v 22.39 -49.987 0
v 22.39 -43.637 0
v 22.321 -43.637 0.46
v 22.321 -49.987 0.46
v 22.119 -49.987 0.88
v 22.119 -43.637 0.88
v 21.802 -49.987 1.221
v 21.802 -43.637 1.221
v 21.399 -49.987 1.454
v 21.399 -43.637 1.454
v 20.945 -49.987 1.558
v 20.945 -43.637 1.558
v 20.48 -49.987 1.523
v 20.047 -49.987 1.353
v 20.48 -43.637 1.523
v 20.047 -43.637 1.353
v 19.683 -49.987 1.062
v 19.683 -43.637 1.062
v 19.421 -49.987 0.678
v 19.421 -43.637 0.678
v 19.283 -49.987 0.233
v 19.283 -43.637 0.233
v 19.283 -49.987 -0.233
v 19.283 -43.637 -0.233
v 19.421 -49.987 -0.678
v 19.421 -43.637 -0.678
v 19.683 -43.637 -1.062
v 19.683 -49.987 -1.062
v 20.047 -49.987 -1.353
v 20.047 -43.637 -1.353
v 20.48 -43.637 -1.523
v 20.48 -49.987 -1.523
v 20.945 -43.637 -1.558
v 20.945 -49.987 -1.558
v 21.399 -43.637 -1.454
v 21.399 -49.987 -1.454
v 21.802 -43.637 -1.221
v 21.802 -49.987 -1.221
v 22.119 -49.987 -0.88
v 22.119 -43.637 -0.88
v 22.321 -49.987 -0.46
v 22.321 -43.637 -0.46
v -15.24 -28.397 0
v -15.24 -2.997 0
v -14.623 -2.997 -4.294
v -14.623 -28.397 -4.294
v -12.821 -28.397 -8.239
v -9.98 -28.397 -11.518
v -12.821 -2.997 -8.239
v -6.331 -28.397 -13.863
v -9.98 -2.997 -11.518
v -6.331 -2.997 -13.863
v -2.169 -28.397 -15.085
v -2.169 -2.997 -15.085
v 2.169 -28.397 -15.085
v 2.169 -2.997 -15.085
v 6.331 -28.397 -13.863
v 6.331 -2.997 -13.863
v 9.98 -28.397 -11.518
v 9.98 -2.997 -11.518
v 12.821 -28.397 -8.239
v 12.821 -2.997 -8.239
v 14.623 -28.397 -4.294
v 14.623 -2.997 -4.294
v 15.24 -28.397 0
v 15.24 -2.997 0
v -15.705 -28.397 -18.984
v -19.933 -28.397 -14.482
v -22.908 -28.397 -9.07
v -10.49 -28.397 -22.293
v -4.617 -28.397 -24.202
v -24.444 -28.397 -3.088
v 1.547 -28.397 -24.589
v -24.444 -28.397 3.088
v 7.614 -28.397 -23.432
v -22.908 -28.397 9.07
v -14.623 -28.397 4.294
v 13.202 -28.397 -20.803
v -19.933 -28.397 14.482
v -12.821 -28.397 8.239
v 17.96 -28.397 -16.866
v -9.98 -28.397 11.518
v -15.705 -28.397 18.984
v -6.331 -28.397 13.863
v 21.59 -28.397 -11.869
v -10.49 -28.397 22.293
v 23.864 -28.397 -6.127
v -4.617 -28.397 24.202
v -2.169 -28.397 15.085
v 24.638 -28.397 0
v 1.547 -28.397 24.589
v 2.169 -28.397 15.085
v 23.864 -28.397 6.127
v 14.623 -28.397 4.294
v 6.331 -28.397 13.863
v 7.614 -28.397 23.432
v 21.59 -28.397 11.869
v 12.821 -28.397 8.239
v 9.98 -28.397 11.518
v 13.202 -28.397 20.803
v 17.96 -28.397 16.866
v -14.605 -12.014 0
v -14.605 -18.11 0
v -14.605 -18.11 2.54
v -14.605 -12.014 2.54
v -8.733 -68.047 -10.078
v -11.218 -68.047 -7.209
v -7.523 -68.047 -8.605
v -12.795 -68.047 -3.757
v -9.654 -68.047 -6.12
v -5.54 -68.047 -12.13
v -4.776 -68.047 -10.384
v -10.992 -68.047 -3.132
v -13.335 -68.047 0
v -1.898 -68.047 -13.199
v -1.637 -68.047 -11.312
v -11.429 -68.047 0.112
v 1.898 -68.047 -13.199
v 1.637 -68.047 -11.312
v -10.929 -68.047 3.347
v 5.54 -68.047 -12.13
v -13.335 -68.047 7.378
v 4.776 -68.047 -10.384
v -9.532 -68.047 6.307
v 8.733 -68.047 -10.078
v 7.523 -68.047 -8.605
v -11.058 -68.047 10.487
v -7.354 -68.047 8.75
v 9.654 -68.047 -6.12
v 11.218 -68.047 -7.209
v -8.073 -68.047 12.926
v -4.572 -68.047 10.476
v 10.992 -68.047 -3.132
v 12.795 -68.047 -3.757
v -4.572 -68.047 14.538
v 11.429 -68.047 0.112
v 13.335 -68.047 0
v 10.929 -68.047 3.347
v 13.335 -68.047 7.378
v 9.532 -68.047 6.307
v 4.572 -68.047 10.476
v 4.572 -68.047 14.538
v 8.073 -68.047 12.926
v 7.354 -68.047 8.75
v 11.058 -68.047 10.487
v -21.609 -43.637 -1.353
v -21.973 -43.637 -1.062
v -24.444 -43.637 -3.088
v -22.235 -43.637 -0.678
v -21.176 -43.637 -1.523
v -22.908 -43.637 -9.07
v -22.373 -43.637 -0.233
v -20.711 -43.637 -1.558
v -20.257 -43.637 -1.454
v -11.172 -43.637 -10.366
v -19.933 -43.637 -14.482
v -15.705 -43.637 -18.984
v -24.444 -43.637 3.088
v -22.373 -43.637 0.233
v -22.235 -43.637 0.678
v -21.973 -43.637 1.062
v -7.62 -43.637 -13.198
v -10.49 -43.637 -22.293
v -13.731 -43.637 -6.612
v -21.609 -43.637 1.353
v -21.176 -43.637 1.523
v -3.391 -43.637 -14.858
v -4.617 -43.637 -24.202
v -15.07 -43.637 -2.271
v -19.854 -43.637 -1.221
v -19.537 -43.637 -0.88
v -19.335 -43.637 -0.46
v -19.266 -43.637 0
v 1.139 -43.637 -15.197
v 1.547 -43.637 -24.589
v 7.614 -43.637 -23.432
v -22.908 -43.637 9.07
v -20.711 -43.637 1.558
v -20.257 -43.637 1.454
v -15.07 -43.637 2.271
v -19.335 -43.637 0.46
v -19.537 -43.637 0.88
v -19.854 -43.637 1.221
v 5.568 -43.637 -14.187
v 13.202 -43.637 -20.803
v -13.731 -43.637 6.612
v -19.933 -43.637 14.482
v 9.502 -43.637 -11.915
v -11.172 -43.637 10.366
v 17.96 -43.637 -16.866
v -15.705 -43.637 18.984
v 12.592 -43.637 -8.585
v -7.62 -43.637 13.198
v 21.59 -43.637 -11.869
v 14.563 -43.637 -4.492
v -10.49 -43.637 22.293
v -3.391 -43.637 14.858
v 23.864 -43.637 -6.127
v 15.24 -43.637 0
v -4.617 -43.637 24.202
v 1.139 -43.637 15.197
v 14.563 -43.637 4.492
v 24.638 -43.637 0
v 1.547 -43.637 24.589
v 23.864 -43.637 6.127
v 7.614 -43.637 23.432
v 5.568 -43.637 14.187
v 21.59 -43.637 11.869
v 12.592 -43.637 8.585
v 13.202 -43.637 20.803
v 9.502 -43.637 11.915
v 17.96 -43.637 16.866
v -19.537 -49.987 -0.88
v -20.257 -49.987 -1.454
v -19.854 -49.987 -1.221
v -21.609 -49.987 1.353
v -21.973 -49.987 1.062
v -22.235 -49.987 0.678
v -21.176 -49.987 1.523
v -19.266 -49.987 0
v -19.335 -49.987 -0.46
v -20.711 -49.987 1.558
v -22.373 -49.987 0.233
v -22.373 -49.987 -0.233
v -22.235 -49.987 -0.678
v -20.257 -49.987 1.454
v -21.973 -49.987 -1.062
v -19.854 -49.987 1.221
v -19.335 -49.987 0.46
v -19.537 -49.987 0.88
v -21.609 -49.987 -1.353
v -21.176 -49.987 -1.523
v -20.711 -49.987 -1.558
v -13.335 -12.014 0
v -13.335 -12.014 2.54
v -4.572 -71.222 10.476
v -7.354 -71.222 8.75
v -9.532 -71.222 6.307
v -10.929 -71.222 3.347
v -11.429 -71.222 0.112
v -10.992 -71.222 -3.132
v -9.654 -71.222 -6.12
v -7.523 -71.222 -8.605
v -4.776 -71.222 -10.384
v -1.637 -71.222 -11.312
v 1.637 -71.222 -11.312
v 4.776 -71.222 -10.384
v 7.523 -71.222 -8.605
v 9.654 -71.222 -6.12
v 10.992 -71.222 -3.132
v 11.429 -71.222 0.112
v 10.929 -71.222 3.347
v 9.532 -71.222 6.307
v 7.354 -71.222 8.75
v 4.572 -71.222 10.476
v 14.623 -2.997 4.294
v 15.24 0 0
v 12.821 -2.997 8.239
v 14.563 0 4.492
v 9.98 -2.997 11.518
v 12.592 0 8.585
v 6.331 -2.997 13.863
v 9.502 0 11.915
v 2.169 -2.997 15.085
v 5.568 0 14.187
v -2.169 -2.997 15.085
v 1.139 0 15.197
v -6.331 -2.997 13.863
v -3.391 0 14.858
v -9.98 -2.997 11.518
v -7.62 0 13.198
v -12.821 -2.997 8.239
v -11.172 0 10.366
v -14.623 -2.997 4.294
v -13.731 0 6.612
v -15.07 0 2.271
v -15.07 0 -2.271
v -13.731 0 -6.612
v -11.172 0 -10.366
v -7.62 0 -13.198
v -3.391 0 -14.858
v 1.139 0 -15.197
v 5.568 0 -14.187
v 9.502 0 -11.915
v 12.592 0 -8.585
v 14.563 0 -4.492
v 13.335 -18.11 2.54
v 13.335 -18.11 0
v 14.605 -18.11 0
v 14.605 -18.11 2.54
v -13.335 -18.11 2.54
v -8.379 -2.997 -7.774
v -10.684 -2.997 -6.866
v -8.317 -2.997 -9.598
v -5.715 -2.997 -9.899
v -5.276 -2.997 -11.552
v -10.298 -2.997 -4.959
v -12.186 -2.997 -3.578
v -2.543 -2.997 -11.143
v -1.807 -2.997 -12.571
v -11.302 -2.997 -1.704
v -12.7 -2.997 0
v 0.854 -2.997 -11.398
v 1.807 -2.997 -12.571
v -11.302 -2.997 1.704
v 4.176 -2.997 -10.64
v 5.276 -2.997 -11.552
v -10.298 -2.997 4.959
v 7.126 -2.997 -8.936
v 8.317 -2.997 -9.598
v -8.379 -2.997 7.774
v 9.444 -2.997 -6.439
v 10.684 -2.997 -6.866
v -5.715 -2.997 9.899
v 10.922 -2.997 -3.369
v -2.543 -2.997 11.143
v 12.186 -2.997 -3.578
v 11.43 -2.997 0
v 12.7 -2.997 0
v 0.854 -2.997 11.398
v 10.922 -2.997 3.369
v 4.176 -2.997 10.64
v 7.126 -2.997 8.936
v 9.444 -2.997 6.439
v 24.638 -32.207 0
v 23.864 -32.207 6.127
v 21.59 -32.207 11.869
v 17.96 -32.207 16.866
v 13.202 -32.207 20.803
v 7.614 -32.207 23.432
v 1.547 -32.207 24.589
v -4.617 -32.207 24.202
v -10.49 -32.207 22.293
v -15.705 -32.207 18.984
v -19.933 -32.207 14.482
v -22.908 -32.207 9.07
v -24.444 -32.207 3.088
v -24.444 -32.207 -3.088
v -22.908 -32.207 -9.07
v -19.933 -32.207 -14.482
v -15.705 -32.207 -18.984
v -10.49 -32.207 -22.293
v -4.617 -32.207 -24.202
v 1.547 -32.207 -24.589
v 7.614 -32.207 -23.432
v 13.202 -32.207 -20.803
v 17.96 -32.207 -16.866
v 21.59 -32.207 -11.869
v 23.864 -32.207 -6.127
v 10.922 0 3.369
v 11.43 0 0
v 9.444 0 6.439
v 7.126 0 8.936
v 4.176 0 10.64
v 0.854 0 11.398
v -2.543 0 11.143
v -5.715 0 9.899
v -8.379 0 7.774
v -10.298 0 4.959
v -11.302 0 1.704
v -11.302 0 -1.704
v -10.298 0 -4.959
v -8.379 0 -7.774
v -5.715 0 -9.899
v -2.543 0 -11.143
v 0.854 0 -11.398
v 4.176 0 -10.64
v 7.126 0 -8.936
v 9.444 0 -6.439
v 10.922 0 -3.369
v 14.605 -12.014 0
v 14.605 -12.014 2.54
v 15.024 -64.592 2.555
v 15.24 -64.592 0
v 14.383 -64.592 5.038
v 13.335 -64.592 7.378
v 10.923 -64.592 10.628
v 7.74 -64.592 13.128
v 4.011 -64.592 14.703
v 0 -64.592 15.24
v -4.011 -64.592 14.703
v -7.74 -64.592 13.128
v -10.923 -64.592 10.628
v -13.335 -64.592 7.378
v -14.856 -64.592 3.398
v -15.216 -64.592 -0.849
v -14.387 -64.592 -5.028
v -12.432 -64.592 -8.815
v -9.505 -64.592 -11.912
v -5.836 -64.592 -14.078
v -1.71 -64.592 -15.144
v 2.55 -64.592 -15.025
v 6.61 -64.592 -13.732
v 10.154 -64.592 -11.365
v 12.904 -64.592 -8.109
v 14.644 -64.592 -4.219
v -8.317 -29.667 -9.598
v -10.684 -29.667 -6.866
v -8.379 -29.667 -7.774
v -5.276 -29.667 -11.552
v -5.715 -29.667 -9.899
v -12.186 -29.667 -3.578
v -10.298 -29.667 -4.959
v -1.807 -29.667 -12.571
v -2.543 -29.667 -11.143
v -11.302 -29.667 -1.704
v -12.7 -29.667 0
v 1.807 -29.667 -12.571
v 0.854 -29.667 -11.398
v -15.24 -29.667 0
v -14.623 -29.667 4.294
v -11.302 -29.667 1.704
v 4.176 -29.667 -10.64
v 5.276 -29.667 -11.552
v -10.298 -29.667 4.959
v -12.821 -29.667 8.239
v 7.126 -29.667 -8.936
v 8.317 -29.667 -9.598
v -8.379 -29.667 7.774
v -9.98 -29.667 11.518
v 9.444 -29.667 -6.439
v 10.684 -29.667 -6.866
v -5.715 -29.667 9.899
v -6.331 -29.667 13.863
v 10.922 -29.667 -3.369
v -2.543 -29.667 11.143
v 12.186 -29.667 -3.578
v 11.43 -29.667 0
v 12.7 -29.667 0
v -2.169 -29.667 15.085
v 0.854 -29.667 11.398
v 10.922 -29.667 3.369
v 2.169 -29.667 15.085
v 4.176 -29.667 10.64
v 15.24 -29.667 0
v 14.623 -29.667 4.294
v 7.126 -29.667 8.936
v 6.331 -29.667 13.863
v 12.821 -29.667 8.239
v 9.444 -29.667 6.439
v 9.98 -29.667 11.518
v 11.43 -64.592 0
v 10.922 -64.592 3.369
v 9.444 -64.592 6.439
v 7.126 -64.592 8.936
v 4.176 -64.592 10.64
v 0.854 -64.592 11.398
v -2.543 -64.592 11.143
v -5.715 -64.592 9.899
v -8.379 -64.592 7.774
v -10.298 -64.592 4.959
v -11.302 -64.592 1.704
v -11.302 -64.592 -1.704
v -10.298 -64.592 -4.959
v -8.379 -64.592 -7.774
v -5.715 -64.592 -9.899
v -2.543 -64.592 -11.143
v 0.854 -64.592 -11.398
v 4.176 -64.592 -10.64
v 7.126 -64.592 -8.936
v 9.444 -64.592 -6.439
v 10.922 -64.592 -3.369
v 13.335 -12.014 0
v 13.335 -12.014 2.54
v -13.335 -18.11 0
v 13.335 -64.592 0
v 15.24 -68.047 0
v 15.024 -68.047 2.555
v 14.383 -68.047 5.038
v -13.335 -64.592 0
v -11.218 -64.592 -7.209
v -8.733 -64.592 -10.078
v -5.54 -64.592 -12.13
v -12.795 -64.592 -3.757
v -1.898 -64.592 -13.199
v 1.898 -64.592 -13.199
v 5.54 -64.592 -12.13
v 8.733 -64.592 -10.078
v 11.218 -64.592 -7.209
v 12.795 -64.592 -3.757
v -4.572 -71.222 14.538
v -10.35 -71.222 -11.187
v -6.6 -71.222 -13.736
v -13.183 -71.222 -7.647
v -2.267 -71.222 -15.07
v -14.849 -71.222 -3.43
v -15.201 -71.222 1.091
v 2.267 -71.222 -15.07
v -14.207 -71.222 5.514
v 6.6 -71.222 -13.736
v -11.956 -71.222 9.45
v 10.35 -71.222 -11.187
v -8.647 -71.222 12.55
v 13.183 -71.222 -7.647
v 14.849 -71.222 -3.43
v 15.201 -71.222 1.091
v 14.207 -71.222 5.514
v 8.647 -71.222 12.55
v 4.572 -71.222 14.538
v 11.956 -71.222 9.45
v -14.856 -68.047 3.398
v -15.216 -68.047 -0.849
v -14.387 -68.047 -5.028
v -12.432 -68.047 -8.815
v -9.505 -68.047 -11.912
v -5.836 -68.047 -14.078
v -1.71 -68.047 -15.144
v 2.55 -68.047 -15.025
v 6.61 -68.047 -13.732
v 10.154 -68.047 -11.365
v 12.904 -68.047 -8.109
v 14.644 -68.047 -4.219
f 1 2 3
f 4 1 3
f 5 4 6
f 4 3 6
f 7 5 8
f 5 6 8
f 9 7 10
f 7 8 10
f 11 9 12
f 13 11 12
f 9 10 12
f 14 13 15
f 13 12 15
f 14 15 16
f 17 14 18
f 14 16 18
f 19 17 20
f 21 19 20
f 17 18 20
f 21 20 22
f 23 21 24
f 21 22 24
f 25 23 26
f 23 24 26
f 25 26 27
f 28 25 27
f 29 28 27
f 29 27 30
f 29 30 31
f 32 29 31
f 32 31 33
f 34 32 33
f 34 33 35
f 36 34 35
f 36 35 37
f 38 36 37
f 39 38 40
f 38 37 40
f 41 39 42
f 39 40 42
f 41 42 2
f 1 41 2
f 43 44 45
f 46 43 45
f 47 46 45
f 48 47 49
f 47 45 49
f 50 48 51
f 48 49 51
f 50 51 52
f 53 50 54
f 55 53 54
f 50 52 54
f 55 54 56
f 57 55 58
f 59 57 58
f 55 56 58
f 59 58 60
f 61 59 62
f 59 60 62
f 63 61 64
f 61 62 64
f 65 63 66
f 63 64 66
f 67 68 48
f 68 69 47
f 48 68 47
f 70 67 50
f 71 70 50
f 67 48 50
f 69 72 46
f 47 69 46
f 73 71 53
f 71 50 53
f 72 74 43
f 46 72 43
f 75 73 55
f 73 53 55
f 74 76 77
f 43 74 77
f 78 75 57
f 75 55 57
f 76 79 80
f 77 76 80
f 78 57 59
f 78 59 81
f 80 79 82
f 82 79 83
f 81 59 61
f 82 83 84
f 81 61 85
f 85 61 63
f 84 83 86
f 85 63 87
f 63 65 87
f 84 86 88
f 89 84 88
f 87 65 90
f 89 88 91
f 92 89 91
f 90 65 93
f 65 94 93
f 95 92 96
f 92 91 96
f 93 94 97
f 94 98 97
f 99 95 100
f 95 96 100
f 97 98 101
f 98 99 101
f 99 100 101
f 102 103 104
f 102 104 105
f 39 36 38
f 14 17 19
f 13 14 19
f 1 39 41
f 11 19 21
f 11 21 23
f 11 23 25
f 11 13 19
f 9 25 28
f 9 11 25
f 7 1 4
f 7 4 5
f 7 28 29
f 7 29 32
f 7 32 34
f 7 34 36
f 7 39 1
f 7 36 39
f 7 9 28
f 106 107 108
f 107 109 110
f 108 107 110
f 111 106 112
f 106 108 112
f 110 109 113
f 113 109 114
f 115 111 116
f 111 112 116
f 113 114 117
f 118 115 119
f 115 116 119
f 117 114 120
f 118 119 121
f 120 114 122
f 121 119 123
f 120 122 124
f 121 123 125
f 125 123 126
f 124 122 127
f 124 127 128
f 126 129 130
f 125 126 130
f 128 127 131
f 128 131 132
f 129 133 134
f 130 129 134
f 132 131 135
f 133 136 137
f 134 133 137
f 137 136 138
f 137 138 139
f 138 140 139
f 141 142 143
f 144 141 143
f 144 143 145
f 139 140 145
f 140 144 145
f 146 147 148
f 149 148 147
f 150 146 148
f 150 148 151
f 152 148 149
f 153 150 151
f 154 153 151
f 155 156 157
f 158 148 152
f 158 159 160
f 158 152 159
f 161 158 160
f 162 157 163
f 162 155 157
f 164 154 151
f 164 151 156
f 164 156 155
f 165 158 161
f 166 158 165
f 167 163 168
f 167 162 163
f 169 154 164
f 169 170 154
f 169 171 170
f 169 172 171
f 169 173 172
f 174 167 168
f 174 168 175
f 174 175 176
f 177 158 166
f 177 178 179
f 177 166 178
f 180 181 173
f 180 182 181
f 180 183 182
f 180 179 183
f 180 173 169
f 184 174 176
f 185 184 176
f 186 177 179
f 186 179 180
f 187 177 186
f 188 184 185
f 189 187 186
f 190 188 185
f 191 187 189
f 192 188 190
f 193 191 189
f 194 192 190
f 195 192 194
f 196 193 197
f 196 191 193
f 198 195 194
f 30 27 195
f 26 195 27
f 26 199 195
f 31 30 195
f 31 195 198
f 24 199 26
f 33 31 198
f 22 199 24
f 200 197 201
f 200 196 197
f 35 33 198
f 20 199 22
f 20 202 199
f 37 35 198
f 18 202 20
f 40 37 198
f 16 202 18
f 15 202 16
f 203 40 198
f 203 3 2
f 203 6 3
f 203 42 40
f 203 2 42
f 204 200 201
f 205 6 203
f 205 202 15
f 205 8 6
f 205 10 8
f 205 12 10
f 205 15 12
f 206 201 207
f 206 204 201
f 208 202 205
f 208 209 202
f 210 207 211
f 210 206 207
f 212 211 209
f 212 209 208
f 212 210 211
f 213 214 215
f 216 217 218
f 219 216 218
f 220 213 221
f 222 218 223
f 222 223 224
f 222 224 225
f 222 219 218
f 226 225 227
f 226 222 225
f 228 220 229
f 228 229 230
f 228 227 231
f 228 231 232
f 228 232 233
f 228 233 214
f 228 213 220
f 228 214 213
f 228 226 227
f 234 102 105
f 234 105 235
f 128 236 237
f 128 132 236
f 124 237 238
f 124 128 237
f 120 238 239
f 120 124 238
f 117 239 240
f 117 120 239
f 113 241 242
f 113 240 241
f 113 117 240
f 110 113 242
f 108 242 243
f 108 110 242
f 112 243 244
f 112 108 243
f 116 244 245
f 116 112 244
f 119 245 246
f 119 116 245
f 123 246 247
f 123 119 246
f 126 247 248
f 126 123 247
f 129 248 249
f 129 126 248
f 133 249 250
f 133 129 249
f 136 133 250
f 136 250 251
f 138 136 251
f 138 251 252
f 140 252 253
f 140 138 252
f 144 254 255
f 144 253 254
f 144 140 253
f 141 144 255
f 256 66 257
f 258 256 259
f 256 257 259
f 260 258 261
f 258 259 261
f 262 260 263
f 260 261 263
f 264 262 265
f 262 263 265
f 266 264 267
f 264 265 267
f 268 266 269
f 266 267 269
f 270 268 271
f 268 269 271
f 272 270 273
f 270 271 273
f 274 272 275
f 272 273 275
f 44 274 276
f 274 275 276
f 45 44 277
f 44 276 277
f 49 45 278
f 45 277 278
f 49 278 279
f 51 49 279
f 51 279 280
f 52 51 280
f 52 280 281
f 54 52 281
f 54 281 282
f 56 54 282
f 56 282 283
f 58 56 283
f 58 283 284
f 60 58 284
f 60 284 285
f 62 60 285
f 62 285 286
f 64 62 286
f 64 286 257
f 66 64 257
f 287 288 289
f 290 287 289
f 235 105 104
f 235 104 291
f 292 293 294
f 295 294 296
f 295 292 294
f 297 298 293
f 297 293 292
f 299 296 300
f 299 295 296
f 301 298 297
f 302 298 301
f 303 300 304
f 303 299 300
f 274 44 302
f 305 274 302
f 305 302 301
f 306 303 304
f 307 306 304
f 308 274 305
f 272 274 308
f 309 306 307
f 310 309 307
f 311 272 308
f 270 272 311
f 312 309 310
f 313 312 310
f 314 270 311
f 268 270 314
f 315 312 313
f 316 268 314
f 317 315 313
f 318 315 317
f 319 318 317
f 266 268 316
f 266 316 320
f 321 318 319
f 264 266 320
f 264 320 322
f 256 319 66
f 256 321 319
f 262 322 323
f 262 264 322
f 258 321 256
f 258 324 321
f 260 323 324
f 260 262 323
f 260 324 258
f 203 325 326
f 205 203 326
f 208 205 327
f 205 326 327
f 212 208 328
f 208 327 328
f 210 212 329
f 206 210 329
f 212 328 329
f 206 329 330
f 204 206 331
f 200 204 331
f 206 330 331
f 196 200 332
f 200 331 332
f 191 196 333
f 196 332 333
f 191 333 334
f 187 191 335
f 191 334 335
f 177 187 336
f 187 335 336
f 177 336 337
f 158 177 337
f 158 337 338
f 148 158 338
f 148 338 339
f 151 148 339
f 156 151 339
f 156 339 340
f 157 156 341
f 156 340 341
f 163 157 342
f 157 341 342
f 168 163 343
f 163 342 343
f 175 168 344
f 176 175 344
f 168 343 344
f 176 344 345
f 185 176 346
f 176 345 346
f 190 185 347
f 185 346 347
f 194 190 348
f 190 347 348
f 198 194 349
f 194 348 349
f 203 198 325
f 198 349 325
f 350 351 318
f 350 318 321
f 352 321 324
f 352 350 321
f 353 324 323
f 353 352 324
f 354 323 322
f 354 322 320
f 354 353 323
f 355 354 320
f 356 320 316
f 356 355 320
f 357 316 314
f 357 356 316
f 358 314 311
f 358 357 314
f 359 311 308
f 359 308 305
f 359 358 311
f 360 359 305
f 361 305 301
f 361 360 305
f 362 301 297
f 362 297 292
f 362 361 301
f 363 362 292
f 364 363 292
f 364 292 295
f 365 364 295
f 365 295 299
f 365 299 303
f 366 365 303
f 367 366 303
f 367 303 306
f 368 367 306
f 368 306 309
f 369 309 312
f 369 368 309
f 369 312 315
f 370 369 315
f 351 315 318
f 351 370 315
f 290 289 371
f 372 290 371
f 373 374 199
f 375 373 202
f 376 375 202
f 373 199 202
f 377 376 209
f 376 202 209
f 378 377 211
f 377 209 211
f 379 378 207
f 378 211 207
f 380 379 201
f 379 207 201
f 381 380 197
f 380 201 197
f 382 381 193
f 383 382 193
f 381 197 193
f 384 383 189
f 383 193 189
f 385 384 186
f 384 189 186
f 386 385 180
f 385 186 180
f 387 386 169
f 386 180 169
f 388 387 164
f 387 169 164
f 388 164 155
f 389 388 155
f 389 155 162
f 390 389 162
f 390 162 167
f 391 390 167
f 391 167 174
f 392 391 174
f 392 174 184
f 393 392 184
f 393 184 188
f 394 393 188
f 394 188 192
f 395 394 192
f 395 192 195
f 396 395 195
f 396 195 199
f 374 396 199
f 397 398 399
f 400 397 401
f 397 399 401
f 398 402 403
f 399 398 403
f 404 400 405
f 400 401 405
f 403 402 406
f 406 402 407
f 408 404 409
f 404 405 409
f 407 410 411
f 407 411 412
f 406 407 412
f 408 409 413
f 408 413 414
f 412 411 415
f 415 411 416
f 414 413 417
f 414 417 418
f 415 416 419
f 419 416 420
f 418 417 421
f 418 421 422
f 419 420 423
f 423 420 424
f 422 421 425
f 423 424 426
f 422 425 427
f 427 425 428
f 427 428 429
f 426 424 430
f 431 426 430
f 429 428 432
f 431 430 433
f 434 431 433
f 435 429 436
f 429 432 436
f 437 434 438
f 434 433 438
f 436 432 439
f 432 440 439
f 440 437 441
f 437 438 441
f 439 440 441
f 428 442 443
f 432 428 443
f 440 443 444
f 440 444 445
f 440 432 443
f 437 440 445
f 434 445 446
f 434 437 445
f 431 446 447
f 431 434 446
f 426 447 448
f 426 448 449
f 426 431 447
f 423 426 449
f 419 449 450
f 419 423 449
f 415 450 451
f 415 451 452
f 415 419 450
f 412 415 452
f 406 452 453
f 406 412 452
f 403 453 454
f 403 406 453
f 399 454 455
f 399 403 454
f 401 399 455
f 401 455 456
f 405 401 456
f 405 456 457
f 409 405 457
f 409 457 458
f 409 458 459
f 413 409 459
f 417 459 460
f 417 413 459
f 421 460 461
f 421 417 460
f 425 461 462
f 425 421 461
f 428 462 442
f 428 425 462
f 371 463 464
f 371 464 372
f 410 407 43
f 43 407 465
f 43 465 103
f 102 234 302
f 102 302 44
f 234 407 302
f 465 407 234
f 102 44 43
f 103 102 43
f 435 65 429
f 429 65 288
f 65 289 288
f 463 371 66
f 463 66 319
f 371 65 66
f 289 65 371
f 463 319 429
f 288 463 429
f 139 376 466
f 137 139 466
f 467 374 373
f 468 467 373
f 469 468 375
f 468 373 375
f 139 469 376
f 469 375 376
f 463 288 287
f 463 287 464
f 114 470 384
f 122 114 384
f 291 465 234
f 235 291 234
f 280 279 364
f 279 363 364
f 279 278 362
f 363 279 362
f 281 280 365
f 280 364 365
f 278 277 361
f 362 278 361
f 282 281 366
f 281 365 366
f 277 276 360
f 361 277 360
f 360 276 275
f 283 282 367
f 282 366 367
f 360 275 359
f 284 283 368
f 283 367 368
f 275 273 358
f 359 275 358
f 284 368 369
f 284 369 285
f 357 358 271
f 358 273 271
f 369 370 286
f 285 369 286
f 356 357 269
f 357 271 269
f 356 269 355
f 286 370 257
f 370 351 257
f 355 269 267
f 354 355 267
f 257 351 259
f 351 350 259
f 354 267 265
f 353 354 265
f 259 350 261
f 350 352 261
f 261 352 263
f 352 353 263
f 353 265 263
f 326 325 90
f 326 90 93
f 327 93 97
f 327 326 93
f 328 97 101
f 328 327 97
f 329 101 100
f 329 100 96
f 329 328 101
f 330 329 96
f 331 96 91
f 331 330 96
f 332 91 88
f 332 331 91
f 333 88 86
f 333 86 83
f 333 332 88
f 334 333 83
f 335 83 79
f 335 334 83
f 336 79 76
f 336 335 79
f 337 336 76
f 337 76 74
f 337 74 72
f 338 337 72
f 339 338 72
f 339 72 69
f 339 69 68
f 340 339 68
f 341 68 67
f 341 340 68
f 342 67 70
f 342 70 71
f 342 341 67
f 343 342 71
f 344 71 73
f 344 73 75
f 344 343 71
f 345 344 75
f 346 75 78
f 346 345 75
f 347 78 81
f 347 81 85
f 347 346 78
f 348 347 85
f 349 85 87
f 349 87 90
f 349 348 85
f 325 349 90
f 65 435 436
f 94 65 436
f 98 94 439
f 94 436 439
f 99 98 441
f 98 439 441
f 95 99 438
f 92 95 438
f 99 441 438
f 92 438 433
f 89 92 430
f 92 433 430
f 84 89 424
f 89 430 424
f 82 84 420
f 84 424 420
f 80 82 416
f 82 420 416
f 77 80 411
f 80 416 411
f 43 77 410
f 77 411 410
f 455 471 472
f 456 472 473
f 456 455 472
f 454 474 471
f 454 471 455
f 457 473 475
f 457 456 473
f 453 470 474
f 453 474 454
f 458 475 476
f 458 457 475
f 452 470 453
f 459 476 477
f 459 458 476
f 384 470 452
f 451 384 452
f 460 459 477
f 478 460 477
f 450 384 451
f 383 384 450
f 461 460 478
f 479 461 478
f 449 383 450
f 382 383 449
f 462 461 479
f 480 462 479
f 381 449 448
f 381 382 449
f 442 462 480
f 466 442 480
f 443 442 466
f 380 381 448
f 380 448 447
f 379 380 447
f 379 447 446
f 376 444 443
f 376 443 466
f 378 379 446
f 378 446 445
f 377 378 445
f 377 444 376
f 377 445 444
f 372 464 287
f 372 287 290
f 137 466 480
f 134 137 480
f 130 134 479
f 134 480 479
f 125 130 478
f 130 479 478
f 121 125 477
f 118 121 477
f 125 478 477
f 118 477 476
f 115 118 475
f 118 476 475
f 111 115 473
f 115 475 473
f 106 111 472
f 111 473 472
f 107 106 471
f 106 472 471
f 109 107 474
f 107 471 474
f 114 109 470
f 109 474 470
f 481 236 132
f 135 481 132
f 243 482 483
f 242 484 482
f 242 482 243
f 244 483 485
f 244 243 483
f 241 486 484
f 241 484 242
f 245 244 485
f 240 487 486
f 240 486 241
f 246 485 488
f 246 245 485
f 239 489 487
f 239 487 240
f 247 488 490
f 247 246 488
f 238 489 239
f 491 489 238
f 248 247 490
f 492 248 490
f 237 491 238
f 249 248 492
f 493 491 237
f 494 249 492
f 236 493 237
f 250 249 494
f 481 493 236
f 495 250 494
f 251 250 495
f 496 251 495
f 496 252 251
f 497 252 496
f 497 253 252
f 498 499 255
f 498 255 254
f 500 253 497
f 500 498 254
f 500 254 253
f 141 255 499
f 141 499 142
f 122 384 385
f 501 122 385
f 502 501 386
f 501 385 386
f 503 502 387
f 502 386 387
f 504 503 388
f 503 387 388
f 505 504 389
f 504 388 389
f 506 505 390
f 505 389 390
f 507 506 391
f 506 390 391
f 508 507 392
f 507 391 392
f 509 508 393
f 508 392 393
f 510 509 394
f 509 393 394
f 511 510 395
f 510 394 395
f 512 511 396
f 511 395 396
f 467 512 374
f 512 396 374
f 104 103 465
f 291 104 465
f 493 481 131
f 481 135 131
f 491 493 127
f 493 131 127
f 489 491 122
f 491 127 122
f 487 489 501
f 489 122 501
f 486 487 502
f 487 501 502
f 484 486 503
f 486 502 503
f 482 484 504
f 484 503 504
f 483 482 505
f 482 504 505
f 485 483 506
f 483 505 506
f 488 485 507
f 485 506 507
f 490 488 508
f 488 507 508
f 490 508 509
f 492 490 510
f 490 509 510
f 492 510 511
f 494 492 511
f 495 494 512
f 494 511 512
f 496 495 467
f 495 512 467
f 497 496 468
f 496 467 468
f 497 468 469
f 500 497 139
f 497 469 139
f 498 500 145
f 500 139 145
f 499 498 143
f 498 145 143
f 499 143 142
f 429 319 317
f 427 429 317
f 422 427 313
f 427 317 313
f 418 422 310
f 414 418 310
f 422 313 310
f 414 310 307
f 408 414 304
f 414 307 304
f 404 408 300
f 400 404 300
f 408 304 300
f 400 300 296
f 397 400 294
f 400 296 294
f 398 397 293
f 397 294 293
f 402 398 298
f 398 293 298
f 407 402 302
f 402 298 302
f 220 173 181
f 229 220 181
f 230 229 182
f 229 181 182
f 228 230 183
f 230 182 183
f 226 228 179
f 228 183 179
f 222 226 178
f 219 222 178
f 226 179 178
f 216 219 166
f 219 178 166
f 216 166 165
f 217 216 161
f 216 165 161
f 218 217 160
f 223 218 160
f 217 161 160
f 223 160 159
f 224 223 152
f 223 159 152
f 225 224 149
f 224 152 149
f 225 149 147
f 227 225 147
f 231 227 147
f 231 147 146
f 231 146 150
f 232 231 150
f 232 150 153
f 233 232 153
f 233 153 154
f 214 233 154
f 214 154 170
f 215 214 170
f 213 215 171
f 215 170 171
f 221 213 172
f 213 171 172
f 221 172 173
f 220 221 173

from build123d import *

# Parameters (mm, degrees)
F0_R      = 15.24
F0_R_2    = 11.43
F1_DEPTH  = 2.9972
F3_DEPTH  = 26.67
F4_R      = 15.24
F4_R_2    = 11.43
F5_DEPTH  = 2.54
F6_W      = 9.144
F6_H      = 6.35
F7_DEPTH  = 28.575
F8_W      = 1.27
F8_H      = 6.096
F9_DEPTH  = 2.54
F10_R     = 24.638
F10_R_2   = 15.24
F11_DEPTH = 3.81
F12_DEPTH = 11.43
F13_R     = 15.24
F13_R_2   = 11.43
F14_DEPTH = 20.955
F16_DEPTH = 3.4544
F17_R     = 15.24
F17_R_2   = 11.43
F18_DEPTH = 3.175
F19_DEPTH = 25.4
F20_R     = 1.5621
F21_DEPTH = 6.35


with BuildPart() as f1:
    # F0 (on Front) → F1 (new body)
    with BuildSketch(Plane.XZ):
        Circle(F0_R)
        Circle(F0_R_2, mode=Mode.SUBTRACT)
    extrude(amount=F1_DEPTH)

    # F2 (on face) → F3 (join)
    with BuildSketch(Plane.XZ.offset(2.9972)):
        with BuildLine():
            Line((15.24, 0), (12.7, 0))
            ThreePointArc((12.7, 0), (0, -12.7), (-12.7, 0))
            Line((-12.7, 0), (-15.24, 0))
            ThreePointArc((-15.24, 0), (0, -15.24), (15.24, 0))
        make_face()
    extrude(amount=F3_DEPTH)

    # F4 (on face) → F5 (join)
    with BuildSketch(Plane.XZ.offset(29.6672)):
        Circle(F4_R)
        Circle(F4_R_2, mode=Mode.SUBTRACT)
    extrude(amount=F5_DEPTH)

    # F6 (on Top) → F7 (cut)
    with BuildSketch(Plane.XY):
        Polygon((-13.335, -64.7192), (-13.335, -68.0212), (-4.572, -68.0212), (4.572, -68.0212), (13.335, -68.0212), (13.335, -64.7192), align=None)
        with Locations((0, -71.1962)):
            Rectangle(F6_W, F6_H)
    extrude(amount=F7_DEPTH, mode=Mode.SUBTRACT)

    # F8 (on face) → F9 (join)
    with BuildSketch(Plane.XY):
        with Locations((13.97, -15.0622)):
            Rectangle(F8_W, F8_H)
        with Locations((-13.97, -15.0622)):
            Rectangle(F8_W, F8_H)
    extrude(amount=F9_DEPTH)

    # F10 (on face) → F11 (join)
    with BuildSketch(Plane.XZ.offset(32.2072)):
        Circle(F10_R)
        Circle(F10_R_2, mode=Mode.SUBTRACT)
    extrude(amount=-F11_DEPTH)

    # F12 (add): a face of the model
    f12_faces = [f1.faces().sort_by_distance(p)[0] for p in [
        (-23.941132125, -32.2072, 0),
    ]]
    extrude(f12_faces, amount=F12_DEPTH)

    # F13 (on face) → F14 (join)
    with BuildSketch(Plane.XZ.offset(43.6372)):
        Circle(F13_R)
        Circle(F13_R_2, mode=Mode.SUBTRACT)
    extrude(amount=F14_DEPTH)

    # F15 (on face) → F16 (join)
    with BuildSketch(Plane.XZ.offset(64.5922)):
        with BuildLine():
            Line((13.335, 7.3780332745), (13.335, 0))
            ThreePointArc((13.335, 0), (0, -13.335), (-13.335, 0))
            Line((-13.335, 0), (-13.335, 7.3780332745))
            ThreePointArc((-13.335, 7.3780332745), (-3.81, -14.7560665491), (15.24, 0))
            ThreePointArc((15.24, 0), (14.7560665491, 3.81), (13.335, 7.3780332745))
        make_face()
    extrude(amount=F16_DEPTH)

    # F17 (on face) → F18 (join)
    with BuildSketch(Plane.XZ.offset(68.0466)):
        Circle(F17_R)
        Circle(F17_R_2, mode=Mode.SUBTRACT)
    extrude(amount=F18_DEPTH)

    # F6 (on Top) → F19 (cut)
    with BuildSketch(Plane.XY):
        Polygon((-13.335, -64.7192), (-13.335, -68.0212), (-4.572, -68.0212), (4.572, -68.0212), (13.335, -68.0212), (13.335, -64.7192), align=None)
        with Locations((0, -71.1962)):
            Rectangle(F6_W, F6_H)
    extrude(amount=F19_DEPTH, mode=Mode.SUBTRACT)

    # F20 (on face) → F21 (join)
    with BuildSketch(Plane.XZ.offset(43.6372)):
        with Locations((20.828, 0)):
            Circle(F20_R)
        with Locations((-20.828, 0)):
            Circle(F20_R)
    extrude(amount=F21_DEPTH)


solid = f1.part
